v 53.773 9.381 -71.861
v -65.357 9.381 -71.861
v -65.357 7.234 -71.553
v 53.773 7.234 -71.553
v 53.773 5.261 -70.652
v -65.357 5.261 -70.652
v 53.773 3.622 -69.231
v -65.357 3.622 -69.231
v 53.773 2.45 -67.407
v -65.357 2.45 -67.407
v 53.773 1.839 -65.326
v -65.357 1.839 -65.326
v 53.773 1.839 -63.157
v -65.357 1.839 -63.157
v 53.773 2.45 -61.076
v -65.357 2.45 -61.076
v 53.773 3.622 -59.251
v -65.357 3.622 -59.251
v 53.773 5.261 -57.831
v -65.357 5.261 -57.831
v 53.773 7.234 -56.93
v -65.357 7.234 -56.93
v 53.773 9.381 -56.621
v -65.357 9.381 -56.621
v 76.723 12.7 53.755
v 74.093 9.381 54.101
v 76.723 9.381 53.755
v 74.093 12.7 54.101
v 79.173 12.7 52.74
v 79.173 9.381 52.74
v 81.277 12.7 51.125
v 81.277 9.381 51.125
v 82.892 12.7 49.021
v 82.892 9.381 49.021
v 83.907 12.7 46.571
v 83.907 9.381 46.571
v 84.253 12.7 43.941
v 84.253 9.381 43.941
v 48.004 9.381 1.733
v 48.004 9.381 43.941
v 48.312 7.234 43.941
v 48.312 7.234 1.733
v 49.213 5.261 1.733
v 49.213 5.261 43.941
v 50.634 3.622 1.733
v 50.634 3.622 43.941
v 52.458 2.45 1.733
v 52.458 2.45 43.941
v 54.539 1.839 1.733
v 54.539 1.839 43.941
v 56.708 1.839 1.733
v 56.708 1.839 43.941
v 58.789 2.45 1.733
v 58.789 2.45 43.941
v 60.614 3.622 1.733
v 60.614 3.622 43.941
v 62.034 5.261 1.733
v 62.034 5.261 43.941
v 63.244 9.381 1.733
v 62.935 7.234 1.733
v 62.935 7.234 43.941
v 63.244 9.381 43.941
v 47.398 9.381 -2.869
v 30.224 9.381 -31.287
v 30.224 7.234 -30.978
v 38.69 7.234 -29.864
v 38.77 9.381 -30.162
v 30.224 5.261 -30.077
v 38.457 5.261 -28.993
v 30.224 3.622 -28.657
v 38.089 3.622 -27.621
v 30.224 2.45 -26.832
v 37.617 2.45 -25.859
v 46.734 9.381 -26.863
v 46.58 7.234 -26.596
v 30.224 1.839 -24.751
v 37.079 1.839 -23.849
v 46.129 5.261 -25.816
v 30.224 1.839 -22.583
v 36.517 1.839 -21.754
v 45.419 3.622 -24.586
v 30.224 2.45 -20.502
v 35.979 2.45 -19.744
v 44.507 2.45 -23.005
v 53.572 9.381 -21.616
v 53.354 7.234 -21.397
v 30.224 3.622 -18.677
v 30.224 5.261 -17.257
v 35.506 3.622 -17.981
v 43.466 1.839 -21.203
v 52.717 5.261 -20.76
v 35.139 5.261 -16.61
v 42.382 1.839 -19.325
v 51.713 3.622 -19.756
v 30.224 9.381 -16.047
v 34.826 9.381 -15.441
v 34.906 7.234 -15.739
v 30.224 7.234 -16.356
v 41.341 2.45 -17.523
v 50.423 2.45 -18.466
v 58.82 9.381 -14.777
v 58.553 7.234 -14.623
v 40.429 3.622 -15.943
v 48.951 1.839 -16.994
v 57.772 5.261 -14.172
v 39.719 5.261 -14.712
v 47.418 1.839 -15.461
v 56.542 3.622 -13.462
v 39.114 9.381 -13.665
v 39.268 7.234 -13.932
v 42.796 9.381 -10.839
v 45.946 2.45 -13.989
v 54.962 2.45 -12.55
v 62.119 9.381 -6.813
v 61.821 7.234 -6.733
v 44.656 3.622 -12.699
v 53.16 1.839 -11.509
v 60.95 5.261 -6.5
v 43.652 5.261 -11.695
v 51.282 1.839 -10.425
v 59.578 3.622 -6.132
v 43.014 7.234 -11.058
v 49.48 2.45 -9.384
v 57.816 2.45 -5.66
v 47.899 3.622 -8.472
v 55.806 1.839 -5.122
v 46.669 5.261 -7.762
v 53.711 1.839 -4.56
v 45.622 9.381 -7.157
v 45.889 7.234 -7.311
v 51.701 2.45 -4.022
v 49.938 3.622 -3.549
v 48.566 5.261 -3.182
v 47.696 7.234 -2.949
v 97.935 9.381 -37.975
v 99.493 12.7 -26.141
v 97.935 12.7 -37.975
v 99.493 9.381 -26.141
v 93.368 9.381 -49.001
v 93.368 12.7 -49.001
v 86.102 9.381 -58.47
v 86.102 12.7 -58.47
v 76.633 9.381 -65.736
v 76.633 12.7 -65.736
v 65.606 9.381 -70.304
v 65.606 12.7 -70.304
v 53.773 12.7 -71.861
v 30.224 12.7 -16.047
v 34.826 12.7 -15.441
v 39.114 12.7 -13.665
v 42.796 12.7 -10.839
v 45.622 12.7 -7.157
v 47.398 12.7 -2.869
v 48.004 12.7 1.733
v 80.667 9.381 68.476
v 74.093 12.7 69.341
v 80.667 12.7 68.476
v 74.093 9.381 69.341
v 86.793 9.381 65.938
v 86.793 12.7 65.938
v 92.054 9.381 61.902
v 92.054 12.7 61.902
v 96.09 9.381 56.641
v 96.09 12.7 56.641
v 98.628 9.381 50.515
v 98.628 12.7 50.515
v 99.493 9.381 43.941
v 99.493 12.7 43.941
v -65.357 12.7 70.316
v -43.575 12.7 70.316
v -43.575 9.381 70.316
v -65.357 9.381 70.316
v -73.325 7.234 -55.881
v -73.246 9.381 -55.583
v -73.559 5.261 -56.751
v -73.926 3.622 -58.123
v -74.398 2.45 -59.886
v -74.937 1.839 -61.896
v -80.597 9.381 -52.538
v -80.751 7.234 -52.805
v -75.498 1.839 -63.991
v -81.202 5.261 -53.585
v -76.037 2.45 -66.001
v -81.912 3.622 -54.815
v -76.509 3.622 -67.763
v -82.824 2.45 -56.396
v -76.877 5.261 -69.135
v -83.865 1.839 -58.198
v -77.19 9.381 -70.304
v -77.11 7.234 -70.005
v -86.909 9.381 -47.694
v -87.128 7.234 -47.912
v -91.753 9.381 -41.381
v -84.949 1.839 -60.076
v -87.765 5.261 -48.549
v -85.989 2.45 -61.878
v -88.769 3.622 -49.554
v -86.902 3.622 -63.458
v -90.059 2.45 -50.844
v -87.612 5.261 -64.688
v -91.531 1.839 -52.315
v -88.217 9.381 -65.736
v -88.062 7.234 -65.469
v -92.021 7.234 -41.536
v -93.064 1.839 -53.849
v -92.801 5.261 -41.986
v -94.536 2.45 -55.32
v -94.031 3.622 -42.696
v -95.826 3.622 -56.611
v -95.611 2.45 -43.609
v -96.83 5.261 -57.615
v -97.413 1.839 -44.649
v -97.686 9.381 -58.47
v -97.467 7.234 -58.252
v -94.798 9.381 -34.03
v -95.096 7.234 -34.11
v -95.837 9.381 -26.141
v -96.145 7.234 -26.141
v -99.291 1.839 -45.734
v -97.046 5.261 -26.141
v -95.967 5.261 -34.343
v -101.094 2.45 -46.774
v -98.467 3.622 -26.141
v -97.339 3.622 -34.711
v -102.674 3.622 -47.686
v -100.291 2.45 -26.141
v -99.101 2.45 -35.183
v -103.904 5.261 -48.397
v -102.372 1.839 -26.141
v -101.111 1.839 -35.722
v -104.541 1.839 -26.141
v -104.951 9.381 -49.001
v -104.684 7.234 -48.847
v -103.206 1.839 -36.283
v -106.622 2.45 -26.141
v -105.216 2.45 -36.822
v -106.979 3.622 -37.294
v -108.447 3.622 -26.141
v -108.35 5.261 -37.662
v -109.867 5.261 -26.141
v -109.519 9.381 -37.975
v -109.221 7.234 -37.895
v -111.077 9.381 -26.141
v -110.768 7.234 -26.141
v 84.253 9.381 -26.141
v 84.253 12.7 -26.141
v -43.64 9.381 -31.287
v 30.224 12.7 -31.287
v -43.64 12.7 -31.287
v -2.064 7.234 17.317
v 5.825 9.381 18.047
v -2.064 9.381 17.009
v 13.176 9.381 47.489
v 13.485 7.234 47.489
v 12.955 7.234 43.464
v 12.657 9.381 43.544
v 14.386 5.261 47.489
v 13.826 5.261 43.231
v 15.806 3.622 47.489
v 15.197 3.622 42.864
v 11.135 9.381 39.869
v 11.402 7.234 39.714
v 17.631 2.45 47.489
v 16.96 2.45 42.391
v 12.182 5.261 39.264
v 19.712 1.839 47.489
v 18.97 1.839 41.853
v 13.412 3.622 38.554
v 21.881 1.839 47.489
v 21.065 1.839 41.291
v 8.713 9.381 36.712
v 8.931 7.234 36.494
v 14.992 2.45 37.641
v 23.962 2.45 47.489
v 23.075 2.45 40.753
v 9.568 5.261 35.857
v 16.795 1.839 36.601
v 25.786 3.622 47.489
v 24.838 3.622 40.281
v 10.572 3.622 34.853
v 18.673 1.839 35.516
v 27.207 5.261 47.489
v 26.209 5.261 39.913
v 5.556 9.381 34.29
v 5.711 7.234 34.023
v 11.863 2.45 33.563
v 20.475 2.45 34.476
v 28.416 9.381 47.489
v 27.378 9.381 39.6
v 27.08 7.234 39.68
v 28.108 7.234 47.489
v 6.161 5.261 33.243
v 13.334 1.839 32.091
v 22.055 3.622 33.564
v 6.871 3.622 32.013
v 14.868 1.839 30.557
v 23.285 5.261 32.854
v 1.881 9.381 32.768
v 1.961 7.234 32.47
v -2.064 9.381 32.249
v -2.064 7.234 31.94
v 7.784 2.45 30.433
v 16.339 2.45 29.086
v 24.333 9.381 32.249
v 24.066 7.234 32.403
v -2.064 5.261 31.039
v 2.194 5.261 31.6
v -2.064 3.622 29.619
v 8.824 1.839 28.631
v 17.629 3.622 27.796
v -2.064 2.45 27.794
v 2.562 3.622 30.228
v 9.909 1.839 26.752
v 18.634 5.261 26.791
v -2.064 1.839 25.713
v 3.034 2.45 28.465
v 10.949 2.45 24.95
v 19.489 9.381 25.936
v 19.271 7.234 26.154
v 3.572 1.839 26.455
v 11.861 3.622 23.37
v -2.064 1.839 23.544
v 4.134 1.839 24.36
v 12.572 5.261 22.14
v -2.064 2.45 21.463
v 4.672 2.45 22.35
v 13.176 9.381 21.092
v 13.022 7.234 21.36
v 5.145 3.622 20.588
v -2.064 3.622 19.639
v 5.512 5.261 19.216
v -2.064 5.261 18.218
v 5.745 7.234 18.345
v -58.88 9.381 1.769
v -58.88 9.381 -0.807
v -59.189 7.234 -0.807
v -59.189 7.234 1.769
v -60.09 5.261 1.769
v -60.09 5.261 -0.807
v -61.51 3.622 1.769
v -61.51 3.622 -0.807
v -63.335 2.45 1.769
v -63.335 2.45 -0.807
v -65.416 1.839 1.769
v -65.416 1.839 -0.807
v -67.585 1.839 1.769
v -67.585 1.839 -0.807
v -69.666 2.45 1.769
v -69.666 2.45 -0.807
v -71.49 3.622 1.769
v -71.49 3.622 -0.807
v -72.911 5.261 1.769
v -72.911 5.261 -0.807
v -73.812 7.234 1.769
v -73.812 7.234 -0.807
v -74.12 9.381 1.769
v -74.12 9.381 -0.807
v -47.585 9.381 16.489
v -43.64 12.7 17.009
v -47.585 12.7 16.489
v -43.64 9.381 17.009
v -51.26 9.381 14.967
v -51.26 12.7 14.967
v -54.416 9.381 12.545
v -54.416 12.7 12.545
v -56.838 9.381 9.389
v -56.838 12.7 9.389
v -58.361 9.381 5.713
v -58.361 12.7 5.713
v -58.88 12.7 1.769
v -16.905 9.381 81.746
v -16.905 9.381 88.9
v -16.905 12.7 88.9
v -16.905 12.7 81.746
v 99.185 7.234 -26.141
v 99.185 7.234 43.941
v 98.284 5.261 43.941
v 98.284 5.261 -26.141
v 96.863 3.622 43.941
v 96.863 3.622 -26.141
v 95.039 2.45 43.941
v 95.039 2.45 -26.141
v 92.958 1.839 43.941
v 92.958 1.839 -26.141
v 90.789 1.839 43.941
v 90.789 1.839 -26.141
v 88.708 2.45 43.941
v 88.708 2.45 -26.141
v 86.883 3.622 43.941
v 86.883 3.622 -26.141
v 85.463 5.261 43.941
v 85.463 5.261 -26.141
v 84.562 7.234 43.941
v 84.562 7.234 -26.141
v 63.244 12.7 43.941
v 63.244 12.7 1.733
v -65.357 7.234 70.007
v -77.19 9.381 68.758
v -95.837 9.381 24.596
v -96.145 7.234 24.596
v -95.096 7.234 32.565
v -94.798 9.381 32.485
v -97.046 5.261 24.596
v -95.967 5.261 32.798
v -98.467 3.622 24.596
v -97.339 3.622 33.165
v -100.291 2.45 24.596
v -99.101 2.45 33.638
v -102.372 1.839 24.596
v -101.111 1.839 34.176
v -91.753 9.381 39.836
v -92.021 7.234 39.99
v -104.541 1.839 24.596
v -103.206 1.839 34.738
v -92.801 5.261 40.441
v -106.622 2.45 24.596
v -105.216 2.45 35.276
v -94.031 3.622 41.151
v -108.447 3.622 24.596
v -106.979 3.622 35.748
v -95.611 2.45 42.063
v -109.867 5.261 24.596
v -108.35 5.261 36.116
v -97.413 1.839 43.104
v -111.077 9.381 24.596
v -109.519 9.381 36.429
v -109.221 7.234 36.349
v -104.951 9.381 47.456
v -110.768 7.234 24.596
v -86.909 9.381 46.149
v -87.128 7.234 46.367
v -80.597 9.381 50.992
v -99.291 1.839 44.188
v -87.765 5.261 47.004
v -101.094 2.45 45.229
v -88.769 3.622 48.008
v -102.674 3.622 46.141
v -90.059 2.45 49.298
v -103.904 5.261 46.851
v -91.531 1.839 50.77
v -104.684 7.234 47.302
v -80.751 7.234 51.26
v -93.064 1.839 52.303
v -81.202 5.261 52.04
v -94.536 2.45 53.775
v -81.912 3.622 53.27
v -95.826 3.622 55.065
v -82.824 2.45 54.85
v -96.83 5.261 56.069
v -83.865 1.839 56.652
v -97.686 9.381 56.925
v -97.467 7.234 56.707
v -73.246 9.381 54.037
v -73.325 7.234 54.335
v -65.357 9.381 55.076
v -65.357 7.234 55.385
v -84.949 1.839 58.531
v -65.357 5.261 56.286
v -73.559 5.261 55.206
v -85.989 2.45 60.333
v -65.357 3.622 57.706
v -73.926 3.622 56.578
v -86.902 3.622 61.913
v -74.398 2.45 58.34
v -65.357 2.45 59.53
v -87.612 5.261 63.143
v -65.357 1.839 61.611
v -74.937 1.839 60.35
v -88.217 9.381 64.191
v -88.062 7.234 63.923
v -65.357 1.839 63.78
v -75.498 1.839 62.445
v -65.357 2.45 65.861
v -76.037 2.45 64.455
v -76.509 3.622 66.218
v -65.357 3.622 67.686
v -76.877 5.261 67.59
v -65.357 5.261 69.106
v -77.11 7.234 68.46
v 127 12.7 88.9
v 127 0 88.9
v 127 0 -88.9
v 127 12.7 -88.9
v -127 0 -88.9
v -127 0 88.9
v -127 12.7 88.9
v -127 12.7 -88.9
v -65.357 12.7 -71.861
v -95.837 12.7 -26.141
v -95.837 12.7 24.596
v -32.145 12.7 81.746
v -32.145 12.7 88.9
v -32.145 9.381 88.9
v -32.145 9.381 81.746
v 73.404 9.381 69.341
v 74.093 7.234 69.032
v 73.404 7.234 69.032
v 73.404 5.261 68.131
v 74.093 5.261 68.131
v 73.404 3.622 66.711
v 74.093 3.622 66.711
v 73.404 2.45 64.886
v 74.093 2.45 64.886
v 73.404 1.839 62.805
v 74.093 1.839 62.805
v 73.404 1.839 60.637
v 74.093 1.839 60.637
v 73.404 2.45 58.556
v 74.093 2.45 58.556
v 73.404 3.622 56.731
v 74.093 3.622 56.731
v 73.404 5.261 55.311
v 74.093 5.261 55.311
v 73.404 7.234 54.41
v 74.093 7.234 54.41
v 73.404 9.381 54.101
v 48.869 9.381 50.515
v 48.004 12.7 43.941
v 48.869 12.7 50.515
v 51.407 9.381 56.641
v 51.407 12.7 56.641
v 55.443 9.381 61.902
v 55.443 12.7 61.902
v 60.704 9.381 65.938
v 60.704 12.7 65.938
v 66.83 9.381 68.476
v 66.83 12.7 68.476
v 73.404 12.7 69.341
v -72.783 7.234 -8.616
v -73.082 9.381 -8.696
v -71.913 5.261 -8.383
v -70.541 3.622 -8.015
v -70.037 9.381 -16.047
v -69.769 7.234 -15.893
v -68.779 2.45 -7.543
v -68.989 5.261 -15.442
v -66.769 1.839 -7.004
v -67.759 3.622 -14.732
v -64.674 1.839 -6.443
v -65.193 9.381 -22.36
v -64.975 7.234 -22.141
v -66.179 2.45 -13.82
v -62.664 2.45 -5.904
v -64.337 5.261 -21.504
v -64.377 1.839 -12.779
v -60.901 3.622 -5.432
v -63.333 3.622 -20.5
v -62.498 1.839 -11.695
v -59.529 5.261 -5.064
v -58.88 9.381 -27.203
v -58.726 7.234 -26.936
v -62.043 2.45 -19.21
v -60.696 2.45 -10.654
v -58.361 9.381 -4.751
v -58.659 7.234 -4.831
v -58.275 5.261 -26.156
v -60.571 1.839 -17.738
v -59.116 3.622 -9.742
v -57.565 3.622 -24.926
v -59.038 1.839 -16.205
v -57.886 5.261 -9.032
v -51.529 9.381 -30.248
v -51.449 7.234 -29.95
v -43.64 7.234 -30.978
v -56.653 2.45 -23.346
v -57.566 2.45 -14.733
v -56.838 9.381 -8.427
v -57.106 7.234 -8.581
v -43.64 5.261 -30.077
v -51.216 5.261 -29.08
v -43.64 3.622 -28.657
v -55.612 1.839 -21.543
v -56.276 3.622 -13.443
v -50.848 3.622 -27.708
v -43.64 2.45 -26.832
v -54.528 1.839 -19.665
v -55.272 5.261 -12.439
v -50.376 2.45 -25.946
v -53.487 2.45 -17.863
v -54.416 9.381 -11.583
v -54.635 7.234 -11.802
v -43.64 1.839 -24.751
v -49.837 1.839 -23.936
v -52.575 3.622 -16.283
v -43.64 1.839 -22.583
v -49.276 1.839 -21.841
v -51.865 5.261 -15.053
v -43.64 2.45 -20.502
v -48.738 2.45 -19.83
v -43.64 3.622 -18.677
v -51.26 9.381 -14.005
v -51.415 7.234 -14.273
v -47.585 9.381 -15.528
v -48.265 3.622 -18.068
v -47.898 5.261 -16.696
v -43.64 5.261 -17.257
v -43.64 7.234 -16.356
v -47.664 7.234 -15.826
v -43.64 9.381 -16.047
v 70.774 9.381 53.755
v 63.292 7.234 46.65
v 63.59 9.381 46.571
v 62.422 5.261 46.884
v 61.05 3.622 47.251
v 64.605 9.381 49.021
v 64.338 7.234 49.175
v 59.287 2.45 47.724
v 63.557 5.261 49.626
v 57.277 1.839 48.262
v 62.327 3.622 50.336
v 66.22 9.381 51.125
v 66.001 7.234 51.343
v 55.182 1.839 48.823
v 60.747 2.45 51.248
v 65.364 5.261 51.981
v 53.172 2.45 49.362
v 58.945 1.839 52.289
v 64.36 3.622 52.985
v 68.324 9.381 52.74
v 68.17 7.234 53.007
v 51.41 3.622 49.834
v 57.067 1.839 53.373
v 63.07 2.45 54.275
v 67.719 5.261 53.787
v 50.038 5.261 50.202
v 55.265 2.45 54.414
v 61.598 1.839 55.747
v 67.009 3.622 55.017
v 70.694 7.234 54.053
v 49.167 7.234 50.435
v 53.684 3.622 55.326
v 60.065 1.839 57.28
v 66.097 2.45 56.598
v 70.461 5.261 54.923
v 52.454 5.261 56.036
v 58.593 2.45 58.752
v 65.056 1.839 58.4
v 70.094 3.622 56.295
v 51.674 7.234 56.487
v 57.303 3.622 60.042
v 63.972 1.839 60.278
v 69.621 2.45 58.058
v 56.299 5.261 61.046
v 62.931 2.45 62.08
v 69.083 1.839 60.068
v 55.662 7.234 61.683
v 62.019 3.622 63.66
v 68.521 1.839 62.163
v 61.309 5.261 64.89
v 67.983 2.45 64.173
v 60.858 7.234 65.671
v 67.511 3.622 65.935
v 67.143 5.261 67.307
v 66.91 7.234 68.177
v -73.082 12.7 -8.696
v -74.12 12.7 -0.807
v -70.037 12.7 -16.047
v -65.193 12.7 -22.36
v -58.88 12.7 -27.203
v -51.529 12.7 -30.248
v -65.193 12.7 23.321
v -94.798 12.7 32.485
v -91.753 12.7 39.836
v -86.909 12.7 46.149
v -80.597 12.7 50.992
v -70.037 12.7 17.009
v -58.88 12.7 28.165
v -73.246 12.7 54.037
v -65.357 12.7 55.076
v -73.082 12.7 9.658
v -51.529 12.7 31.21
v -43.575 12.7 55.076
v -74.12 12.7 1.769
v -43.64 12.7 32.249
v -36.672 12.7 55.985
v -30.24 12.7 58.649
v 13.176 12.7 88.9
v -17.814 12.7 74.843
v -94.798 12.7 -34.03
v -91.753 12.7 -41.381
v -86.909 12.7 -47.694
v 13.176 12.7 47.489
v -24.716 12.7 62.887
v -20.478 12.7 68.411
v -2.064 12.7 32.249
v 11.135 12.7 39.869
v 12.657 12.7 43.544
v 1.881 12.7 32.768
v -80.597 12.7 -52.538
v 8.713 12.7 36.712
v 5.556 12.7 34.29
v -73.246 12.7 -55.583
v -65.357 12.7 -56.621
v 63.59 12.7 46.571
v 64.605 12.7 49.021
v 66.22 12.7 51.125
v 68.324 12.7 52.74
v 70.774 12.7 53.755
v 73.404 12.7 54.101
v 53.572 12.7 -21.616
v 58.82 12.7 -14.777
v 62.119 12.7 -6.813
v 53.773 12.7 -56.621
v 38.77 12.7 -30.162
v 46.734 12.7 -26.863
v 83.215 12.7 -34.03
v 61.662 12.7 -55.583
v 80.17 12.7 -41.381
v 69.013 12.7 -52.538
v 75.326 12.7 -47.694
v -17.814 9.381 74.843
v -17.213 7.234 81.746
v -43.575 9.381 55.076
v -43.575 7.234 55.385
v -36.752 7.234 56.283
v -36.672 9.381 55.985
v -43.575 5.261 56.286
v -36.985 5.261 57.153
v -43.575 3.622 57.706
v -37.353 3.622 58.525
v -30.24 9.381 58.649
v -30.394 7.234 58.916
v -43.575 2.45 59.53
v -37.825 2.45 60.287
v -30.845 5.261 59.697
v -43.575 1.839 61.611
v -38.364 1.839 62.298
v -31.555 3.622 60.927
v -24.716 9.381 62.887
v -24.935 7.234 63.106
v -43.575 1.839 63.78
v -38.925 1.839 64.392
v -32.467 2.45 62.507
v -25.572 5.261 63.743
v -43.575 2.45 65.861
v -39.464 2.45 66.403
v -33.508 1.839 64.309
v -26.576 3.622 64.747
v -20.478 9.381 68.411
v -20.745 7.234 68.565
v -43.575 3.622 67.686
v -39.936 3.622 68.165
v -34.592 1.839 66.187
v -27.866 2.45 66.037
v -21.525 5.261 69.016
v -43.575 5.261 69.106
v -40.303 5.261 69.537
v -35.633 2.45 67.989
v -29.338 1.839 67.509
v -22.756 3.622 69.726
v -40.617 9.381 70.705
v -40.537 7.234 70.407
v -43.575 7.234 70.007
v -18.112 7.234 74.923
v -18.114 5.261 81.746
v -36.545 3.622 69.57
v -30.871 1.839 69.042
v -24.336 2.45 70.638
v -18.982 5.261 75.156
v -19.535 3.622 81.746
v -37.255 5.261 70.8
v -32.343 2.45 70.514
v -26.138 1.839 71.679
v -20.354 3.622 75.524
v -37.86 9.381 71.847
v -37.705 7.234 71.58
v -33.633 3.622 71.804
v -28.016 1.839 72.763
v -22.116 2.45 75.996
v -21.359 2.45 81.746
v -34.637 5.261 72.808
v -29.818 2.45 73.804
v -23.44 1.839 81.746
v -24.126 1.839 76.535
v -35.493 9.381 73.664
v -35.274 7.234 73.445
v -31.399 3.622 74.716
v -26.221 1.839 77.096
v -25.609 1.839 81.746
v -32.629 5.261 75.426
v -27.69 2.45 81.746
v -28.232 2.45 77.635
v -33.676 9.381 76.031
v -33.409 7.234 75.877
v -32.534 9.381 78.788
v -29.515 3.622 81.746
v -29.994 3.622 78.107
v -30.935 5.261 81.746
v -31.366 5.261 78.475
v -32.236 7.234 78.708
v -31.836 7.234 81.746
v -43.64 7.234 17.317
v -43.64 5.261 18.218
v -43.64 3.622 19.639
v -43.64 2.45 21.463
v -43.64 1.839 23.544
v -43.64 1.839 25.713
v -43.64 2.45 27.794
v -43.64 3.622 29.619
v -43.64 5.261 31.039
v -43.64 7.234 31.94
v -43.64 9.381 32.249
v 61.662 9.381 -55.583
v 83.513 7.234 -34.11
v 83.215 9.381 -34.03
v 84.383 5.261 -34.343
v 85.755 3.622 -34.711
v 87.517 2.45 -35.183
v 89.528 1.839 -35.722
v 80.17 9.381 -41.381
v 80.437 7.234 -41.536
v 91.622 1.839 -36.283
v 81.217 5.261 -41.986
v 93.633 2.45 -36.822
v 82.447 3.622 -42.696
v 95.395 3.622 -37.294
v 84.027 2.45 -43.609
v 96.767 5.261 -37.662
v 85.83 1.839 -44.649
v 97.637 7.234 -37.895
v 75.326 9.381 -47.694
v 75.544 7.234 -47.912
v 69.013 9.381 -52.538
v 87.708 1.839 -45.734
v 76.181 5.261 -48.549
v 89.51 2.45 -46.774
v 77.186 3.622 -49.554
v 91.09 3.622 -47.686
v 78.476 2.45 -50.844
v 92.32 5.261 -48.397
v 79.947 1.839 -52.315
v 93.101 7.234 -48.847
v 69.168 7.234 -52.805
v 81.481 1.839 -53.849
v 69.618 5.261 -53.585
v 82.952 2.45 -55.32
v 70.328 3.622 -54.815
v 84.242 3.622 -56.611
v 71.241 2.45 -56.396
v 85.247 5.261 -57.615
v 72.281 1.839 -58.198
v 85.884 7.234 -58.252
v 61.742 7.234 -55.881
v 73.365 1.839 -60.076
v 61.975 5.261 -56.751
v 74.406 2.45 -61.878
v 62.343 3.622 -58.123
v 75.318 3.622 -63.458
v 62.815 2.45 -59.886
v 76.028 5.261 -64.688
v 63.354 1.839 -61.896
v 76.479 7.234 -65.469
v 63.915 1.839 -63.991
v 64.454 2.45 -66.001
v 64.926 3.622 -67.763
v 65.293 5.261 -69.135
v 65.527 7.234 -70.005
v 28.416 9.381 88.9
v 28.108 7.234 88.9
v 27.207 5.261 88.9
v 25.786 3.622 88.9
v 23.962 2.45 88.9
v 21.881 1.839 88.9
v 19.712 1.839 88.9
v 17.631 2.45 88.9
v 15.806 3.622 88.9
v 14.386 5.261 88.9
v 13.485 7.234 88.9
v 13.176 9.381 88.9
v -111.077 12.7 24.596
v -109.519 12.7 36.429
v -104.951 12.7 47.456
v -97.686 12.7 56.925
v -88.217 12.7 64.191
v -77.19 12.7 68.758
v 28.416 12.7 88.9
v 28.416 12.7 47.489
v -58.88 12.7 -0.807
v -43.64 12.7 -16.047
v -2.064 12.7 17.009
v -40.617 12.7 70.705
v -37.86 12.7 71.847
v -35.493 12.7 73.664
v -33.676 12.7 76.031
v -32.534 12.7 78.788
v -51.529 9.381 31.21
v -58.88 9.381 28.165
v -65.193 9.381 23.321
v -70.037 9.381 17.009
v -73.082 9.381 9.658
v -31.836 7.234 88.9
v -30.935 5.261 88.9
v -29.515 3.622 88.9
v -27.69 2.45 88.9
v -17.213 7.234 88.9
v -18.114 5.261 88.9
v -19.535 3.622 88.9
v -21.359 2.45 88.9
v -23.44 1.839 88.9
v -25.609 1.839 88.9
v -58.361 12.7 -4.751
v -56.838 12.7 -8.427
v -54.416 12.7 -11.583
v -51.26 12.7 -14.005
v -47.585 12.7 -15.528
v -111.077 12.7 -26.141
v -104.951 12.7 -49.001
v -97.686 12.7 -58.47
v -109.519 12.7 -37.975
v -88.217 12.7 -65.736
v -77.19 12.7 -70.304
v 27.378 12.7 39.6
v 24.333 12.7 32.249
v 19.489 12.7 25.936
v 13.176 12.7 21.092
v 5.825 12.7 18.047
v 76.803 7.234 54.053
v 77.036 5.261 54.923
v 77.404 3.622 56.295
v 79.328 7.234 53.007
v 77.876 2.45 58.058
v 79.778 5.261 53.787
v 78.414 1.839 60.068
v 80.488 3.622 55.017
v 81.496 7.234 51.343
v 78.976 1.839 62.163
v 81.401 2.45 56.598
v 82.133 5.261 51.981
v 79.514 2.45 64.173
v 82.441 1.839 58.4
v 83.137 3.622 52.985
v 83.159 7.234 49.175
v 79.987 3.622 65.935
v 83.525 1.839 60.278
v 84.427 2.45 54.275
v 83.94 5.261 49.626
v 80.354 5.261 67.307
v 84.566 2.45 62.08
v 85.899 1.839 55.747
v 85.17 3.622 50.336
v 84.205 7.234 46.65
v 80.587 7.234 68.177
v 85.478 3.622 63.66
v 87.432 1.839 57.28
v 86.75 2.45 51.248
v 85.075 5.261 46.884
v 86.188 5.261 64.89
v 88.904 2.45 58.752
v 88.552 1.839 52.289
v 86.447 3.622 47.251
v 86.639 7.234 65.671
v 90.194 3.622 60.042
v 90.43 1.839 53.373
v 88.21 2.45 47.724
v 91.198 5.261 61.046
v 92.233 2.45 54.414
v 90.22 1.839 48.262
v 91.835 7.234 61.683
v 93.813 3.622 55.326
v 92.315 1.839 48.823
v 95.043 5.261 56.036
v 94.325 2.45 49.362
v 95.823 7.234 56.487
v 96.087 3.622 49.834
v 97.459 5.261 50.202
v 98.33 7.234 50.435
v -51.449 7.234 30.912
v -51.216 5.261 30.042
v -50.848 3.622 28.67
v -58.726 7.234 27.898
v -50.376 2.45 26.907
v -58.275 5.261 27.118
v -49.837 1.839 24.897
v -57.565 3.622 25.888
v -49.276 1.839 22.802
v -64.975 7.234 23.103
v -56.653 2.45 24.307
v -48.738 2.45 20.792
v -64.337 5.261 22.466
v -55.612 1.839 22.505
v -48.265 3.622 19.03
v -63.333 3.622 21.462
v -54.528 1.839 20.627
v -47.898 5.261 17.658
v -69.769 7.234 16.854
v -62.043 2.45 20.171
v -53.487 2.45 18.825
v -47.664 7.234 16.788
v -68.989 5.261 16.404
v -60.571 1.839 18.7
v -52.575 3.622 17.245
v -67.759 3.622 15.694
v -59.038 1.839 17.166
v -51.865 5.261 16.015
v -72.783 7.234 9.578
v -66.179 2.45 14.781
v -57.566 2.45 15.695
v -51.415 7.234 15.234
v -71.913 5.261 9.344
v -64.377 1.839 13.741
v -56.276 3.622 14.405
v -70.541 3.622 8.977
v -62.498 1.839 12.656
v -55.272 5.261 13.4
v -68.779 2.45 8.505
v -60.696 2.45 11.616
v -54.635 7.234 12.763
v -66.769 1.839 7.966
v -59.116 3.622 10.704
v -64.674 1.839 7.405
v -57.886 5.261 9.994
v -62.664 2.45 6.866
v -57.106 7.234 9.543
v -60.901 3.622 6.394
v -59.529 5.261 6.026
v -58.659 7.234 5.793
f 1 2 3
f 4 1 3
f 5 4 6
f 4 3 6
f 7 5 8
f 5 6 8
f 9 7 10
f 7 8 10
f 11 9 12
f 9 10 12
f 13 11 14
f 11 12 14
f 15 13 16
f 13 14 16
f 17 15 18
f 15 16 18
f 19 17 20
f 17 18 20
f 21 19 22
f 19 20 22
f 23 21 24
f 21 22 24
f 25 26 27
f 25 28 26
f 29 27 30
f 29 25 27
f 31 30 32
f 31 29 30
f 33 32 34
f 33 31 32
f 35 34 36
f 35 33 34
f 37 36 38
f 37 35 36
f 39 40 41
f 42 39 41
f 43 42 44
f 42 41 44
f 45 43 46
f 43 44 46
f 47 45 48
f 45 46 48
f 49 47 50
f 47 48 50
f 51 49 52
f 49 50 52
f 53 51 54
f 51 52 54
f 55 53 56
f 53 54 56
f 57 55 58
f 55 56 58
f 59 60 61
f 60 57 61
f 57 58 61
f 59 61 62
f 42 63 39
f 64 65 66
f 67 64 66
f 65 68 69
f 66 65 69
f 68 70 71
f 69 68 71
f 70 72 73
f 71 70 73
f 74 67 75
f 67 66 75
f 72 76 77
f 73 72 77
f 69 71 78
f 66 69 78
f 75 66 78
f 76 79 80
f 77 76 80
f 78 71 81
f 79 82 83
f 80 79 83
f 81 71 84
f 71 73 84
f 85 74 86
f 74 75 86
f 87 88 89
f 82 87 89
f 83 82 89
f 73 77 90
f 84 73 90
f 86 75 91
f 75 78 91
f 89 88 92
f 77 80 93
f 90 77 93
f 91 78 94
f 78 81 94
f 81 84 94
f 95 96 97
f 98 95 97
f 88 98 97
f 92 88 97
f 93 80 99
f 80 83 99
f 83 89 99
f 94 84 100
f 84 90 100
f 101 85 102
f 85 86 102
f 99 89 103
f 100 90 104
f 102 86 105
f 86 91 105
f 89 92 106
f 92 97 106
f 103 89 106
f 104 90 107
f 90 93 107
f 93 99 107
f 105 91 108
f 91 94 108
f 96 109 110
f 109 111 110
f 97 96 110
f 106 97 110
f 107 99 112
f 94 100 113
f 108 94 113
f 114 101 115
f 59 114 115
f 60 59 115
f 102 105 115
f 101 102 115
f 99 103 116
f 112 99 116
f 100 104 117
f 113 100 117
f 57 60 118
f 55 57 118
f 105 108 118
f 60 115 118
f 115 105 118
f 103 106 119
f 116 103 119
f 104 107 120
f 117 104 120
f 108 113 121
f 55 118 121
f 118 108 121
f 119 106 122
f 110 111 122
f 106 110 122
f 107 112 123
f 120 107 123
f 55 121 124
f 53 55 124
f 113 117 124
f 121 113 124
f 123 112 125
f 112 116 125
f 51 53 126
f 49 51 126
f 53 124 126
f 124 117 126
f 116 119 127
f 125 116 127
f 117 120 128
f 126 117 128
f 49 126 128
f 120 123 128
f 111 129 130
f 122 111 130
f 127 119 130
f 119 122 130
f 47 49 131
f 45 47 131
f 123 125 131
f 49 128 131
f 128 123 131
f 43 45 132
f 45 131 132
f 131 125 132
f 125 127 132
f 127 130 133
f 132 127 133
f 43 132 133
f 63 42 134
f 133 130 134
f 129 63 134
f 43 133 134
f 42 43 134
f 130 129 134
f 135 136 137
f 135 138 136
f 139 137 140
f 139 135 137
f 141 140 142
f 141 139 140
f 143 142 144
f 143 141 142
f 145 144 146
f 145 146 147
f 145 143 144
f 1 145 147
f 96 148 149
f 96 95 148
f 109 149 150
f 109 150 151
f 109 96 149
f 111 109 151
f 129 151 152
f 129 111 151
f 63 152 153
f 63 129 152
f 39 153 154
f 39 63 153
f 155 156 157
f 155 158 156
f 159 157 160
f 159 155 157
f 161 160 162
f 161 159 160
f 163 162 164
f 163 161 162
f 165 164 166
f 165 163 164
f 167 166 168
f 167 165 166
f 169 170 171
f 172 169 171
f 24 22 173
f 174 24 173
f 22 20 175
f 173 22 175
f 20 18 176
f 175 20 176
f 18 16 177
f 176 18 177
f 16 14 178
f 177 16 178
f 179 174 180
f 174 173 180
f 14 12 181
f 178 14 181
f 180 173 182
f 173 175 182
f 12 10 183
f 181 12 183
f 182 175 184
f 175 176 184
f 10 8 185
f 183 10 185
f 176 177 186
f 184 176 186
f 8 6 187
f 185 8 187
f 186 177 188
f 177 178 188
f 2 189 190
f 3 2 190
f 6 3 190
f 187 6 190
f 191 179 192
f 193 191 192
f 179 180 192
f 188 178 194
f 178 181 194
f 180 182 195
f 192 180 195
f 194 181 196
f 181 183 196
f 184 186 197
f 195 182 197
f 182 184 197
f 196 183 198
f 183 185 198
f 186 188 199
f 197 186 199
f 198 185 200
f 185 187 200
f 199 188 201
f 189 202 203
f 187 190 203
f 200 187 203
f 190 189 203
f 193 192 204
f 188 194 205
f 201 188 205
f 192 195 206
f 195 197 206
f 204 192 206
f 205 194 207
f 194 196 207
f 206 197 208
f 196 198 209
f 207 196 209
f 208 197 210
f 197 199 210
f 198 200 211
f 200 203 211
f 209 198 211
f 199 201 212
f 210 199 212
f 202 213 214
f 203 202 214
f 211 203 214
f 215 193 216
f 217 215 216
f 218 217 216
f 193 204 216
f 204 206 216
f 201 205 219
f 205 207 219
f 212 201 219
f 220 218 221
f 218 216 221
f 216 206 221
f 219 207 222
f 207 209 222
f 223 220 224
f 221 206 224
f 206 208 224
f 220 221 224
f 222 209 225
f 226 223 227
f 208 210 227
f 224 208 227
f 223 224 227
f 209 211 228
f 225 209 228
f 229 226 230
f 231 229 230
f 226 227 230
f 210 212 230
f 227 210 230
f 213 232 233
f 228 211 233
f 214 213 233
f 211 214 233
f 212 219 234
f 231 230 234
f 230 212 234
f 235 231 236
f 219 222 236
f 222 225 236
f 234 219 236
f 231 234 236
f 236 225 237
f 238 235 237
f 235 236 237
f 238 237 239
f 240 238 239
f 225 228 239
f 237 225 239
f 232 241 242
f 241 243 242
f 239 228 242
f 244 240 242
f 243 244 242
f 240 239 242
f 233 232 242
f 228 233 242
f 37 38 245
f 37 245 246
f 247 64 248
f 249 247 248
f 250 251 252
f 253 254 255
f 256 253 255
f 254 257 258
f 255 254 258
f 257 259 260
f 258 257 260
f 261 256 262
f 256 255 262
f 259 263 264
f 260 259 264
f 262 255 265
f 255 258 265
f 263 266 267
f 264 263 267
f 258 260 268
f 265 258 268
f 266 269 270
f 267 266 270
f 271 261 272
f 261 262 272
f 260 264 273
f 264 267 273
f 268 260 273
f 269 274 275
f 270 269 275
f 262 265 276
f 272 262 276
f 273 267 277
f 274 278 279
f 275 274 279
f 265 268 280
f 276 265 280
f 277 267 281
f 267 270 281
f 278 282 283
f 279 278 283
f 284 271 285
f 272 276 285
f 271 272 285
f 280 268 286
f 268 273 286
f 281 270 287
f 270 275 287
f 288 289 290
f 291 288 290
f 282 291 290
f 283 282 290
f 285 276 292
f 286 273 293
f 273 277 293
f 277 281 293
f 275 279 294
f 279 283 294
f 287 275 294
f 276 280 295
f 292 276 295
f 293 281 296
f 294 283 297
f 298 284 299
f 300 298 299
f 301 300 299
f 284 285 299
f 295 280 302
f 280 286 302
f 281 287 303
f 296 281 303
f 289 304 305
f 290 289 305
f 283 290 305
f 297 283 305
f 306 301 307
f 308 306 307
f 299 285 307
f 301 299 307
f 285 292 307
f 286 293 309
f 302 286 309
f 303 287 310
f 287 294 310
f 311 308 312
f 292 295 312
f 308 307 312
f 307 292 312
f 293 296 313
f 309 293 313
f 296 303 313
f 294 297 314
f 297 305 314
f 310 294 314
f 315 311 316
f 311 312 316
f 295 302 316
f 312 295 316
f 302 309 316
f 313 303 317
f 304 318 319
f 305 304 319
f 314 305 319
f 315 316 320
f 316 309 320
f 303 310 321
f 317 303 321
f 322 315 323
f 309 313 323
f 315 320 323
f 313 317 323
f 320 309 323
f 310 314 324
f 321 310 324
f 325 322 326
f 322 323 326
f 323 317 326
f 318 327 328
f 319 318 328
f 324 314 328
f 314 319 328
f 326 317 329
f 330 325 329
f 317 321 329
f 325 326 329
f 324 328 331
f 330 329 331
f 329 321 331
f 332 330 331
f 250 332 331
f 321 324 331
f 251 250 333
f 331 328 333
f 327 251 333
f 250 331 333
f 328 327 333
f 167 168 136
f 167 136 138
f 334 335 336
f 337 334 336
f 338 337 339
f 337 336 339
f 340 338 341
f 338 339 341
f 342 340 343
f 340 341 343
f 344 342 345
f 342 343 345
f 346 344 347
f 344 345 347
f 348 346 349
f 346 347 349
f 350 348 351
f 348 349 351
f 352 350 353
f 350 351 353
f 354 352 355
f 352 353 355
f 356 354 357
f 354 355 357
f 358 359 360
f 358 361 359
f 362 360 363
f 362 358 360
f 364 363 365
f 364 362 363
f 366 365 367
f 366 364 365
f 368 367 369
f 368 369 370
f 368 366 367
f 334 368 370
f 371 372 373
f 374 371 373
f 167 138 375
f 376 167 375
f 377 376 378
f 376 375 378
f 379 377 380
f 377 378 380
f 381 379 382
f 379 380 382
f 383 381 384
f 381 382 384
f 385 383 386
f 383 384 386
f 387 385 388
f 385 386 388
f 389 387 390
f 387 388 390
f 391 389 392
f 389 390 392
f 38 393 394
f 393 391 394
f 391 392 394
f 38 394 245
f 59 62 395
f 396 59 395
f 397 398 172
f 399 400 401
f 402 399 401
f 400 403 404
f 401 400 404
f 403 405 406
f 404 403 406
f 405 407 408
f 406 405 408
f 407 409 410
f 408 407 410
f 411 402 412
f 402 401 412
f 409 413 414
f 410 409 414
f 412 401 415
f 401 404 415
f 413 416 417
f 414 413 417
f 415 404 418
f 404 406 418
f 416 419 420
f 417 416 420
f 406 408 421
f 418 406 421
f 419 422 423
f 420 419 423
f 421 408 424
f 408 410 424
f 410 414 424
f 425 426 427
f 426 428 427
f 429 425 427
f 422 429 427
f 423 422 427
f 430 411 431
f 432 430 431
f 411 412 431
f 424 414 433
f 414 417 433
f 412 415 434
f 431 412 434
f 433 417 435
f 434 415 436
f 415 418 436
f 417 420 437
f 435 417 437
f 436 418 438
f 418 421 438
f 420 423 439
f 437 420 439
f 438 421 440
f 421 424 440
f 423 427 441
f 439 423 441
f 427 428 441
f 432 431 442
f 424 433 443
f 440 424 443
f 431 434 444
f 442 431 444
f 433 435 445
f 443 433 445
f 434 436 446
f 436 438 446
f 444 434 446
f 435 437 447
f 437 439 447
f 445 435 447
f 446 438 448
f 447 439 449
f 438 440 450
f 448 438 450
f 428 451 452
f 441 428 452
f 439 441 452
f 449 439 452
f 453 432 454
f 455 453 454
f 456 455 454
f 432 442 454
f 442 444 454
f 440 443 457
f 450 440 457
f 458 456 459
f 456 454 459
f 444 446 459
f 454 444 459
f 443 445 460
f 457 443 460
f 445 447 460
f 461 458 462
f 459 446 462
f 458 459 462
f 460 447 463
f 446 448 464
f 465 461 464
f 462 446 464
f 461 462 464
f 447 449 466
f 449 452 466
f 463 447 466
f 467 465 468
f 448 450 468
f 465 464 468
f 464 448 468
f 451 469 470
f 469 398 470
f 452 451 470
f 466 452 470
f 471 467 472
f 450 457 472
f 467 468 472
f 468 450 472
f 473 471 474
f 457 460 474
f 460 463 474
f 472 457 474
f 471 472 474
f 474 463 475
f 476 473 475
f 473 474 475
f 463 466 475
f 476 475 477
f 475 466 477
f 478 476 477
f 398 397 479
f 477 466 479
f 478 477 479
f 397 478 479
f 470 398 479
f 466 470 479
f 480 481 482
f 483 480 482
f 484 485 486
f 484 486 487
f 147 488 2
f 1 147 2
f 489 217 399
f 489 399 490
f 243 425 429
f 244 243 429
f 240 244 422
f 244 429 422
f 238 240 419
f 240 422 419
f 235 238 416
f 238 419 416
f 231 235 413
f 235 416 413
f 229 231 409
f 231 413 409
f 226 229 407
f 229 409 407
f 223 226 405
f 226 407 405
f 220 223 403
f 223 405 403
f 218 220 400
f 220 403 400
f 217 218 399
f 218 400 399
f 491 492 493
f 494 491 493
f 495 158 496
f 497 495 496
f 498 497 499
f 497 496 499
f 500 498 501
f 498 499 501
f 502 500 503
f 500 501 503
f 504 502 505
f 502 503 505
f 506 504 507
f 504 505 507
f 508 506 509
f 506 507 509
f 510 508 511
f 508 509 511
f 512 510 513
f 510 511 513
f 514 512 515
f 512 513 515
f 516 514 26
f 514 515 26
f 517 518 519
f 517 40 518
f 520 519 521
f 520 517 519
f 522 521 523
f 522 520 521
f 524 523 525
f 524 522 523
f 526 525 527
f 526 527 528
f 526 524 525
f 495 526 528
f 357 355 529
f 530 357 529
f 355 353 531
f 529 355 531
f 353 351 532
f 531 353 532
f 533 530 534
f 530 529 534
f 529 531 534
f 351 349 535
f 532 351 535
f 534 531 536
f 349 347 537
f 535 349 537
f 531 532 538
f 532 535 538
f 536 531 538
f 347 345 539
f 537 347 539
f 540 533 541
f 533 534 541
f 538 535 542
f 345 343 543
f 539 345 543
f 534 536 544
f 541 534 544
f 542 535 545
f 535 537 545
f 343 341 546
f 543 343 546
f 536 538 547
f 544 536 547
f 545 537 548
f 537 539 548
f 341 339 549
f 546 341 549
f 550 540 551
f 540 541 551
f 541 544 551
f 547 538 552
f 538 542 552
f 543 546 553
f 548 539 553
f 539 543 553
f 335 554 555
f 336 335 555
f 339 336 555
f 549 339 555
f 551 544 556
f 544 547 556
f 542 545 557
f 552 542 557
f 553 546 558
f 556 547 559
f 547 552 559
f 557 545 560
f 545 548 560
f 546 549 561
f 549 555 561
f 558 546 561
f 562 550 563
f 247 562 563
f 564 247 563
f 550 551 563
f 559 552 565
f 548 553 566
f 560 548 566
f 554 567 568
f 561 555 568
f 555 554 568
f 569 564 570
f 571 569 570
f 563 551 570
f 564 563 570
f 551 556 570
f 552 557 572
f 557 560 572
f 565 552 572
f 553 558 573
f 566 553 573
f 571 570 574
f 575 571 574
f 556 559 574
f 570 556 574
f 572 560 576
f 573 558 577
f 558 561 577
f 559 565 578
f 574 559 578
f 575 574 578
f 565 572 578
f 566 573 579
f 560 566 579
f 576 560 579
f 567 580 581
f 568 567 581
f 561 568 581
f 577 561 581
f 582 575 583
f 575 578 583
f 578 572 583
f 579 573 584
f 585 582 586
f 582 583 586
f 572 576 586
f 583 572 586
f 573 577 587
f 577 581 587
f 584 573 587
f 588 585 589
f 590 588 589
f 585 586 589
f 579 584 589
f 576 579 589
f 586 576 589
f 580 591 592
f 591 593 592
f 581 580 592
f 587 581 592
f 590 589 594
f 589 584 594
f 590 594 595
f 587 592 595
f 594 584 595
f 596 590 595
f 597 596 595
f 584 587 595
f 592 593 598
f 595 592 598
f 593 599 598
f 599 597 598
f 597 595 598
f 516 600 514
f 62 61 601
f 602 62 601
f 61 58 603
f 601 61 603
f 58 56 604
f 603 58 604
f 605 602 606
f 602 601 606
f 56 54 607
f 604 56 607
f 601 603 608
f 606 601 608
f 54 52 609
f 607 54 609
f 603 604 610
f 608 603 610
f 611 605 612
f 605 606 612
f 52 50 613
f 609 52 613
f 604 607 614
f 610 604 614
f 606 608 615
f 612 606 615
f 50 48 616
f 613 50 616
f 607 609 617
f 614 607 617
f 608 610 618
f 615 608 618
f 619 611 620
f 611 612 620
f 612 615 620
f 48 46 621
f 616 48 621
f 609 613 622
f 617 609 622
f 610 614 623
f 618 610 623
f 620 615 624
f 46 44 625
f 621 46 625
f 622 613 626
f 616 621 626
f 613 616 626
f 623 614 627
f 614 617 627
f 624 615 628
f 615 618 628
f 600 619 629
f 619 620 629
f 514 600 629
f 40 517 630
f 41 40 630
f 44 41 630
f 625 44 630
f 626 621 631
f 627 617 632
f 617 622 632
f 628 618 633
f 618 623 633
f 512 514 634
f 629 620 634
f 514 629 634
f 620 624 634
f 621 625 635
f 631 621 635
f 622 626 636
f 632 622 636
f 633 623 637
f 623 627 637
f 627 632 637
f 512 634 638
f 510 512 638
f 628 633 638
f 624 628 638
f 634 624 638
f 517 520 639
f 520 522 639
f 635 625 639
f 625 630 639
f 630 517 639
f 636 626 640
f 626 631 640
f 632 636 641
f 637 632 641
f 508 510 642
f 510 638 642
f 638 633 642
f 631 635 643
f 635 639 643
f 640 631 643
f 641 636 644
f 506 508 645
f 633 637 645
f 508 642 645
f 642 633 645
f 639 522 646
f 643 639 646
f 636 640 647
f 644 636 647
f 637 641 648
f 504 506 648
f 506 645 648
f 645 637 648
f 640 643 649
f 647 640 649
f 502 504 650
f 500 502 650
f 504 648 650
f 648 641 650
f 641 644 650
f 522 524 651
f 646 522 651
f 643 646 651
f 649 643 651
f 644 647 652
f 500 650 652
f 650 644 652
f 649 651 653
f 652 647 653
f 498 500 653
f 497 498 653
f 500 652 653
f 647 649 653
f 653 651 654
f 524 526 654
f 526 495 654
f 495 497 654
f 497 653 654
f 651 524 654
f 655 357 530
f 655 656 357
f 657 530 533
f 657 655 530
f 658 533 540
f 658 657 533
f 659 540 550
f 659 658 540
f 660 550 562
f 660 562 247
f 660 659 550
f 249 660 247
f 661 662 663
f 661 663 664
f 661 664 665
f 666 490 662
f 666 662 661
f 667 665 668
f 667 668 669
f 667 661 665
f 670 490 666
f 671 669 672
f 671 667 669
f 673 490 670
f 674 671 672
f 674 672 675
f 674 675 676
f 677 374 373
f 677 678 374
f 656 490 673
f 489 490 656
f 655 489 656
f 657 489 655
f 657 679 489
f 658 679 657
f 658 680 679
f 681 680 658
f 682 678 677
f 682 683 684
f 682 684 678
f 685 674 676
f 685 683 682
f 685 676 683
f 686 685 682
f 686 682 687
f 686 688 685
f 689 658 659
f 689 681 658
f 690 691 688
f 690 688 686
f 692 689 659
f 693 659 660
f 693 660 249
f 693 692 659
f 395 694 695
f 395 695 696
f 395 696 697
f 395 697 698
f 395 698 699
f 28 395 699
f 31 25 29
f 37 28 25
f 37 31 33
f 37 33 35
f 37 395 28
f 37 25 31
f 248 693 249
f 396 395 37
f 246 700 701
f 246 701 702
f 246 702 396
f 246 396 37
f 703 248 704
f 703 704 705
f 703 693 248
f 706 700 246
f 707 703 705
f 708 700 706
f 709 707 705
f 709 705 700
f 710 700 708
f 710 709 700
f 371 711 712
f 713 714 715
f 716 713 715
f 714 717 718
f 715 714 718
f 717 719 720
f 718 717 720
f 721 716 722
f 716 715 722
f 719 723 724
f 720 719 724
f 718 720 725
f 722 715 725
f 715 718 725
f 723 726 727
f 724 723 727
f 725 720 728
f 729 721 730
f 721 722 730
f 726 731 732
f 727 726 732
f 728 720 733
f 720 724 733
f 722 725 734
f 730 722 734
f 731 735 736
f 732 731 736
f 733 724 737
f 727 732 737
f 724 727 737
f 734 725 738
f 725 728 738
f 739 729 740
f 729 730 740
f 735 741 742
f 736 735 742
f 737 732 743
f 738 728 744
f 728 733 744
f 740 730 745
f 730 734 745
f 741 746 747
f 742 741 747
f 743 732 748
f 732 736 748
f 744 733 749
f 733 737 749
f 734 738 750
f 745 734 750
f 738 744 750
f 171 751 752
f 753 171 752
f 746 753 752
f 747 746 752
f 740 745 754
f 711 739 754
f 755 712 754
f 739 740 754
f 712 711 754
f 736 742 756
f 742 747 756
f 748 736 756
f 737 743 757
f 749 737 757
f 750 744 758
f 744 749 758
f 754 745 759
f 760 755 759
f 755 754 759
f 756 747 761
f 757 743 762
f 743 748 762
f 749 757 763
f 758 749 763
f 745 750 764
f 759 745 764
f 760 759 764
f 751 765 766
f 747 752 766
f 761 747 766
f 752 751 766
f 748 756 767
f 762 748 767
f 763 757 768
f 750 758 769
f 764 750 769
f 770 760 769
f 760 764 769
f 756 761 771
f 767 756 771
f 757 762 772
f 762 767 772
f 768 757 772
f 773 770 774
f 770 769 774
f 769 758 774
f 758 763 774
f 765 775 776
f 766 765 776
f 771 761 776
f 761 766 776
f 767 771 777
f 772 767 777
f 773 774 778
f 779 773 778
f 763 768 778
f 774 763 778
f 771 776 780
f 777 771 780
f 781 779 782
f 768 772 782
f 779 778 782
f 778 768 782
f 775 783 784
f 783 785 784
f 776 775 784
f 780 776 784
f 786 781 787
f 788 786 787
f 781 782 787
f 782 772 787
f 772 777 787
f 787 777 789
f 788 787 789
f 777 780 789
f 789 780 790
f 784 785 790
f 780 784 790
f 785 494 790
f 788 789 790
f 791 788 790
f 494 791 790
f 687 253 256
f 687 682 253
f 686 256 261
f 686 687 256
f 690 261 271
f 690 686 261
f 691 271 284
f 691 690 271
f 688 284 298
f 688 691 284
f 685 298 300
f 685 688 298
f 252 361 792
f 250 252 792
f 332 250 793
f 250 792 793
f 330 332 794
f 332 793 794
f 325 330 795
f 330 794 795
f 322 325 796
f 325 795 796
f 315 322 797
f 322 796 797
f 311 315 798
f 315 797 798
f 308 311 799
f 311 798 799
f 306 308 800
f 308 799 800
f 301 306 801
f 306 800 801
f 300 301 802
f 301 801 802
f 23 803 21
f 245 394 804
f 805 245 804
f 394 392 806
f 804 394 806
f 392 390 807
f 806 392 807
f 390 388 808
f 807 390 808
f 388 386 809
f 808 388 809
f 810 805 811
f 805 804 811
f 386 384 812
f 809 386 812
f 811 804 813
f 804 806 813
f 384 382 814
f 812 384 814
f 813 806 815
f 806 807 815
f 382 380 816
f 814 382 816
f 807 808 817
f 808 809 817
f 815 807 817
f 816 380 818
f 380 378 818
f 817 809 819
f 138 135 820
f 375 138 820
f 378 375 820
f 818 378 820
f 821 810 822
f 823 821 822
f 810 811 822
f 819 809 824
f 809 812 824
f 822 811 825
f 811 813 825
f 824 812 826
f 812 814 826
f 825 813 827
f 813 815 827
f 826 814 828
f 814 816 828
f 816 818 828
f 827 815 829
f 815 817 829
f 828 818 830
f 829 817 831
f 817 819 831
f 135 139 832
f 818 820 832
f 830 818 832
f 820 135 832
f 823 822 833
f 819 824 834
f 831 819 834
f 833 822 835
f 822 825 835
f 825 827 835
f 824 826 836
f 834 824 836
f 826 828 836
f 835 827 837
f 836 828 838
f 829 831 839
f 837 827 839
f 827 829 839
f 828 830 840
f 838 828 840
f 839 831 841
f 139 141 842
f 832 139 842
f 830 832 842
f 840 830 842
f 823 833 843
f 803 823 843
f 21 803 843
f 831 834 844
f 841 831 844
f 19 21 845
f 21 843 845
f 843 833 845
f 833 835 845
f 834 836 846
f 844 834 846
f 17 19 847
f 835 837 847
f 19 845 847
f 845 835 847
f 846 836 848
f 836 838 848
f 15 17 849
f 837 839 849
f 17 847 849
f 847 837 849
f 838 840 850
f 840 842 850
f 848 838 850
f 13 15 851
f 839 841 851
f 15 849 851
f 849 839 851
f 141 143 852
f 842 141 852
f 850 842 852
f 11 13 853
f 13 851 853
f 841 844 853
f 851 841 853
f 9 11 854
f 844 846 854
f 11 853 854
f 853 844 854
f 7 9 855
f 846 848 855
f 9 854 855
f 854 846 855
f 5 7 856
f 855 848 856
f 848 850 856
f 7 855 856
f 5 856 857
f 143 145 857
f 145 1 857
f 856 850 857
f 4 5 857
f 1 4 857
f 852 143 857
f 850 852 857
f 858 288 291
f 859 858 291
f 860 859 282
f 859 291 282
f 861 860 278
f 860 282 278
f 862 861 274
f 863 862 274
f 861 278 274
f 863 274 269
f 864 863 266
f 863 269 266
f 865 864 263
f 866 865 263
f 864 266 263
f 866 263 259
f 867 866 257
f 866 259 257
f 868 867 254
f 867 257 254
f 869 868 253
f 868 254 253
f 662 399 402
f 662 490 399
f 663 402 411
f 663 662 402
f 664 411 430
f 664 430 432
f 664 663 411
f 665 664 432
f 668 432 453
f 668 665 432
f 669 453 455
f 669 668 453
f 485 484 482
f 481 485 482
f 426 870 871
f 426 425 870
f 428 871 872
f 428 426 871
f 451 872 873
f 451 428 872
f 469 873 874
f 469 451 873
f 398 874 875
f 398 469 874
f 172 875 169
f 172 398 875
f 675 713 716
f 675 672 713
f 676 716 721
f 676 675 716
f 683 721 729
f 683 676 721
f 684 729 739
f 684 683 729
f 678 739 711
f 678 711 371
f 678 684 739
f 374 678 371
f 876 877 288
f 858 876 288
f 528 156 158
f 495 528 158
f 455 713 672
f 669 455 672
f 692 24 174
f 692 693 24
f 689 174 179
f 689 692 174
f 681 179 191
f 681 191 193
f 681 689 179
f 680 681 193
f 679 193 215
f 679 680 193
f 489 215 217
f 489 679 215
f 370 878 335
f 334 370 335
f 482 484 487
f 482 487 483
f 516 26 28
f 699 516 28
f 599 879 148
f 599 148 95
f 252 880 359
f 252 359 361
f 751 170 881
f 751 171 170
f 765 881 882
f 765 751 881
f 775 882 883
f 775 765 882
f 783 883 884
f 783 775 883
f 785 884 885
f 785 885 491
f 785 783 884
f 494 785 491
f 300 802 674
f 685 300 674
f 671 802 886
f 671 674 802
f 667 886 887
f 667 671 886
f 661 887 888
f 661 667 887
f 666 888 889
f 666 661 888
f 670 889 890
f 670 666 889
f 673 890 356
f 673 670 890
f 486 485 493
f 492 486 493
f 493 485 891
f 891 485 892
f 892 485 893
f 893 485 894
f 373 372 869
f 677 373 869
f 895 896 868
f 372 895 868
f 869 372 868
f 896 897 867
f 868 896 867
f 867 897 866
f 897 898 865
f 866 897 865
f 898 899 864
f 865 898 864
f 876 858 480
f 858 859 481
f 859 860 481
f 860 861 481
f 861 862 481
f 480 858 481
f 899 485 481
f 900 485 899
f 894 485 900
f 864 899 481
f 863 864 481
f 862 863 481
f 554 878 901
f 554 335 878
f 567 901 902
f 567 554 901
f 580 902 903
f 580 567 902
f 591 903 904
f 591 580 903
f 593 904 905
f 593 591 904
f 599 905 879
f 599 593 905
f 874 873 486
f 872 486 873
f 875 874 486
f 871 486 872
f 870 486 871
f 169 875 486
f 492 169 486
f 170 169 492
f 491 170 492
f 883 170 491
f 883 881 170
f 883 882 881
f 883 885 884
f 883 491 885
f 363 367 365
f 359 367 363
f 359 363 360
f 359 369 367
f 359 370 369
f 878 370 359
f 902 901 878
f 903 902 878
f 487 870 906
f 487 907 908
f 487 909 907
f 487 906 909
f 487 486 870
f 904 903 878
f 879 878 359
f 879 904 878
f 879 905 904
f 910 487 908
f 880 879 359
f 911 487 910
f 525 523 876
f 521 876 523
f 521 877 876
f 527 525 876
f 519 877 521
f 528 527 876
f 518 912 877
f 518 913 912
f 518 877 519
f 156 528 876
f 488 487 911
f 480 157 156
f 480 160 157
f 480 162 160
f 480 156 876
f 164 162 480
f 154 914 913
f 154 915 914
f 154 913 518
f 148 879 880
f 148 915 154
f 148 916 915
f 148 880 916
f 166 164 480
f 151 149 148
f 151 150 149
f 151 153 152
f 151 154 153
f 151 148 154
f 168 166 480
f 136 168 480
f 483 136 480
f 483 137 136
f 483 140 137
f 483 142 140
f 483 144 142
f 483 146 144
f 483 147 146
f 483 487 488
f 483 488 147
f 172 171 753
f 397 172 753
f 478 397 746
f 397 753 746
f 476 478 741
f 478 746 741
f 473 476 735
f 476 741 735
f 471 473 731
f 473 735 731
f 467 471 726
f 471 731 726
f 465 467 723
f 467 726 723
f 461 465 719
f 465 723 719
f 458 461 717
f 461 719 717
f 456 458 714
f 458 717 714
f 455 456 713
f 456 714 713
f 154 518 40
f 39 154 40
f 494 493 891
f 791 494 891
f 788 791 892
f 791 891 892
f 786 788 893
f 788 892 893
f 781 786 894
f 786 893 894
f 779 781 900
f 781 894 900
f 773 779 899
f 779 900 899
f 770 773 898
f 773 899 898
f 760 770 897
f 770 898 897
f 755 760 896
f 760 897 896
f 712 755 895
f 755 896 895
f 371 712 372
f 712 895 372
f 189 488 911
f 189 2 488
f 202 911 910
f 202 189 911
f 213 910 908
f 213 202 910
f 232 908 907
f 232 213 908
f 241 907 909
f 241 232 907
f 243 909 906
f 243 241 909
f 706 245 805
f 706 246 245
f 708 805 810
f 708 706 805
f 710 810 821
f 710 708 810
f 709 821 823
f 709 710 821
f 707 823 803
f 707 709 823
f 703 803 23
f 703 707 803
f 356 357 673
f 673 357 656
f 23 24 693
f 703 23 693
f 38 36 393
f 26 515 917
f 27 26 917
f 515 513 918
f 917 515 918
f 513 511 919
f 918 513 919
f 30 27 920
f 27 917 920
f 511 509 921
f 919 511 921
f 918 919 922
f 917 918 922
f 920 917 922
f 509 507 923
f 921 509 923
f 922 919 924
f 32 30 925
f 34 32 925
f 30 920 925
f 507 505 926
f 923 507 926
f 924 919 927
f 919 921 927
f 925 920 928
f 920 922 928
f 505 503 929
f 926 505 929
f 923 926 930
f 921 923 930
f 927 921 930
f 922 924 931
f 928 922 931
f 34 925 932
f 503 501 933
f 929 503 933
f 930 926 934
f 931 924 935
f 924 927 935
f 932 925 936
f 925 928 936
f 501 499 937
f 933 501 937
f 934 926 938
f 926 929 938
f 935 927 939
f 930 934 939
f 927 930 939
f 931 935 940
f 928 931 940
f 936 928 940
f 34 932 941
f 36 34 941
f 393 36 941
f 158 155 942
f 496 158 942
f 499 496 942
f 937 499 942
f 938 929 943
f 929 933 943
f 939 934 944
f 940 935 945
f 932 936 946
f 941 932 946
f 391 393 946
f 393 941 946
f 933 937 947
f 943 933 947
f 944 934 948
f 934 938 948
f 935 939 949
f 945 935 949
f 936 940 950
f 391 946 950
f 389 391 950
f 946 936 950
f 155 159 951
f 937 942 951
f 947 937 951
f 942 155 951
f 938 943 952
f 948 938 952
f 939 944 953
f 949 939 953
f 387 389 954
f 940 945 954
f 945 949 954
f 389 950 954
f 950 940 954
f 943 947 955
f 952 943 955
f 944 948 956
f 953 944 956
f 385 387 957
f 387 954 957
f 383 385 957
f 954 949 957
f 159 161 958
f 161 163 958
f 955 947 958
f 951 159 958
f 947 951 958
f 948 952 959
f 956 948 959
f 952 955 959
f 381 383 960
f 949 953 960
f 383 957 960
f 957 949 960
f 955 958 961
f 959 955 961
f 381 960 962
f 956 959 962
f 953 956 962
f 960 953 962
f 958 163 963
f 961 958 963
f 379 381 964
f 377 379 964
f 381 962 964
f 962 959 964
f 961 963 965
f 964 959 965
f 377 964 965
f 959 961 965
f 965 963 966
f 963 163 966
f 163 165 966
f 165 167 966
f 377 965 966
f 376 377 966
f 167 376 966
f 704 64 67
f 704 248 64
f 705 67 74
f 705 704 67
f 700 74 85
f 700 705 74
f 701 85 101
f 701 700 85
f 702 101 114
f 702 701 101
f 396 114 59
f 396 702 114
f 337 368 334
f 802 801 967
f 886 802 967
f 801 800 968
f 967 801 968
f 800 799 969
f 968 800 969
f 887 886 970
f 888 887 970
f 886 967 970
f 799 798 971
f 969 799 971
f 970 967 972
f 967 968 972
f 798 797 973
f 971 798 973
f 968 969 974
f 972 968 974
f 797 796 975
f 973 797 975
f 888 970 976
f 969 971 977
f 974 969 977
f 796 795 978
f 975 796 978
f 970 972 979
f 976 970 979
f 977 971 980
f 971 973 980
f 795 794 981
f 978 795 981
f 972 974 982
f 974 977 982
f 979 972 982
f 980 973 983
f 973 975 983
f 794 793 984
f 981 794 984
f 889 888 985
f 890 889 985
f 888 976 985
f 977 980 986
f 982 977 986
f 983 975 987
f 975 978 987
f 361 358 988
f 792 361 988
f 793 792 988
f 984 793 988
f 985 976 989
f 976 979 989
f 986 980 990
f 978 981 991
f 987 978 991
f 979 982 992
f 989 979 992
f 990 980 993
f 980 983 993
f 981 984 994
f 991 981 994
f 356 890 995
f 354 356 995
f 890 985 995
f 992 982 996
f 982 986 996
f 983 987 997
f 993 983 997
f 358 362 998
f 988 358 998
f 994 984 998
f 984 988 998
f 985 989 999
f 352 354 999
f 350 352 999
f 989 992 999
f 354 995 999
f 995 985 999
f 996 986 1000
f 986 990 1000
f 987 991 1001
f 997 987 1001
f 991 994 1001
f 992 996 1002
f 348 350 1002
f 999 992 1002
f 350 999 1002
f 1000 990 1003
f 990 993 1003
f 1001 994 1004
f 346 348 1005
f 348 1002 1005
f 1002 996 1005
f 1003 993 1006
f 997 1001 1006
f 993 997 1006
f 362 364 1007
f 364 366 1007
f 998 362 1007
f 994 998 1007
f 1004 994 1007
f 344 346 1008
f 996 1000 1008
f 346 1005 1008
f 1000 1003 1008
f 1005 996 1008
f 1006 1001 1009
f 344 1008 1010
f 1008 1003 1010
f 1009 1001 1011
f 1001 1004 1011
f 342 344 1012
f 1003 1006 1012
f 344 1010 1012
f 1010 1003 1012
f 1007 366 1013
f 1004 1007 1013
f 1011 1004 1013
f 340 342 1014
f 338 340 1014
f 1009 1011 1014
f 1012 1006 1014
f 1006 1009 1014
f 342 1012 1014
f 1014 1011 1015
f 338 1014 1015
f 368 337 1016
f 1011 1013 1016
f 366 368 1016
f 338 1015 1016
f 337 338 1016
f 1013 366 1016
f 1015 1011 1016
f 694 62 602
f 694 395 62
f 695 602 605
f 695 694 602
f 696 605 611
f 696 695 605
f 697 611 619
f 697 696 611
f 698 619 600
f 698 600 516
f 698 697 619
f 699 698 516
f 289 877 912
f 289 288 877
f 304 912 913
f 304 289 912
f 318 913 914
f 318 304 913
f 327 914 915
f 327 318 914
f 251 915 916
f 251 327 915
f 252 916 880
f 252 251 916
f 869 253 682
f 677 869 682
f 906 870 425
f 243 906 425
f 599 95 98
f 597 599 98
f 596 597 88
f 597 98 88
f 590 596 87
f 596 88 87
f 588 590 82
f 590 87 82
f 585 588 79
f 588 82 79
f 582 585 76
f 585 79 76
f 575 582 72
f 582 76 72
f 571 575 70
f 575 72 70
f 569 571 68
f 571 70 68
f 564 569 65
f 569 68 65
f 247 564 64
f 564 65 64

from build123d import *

# Parameters (mm, degrees)
SKETCH1_W           = 254
SKETCH1_H           = 177.8
BOSS_EXTRUDE1_DEPTH = 12.7


with BuildPart() as part:
    # Sketch1 → Boss-Extrude1 (new body)
    with BuildSketch(Plane(origin=(0, 0, 0), x_dir=(1, 0, 0), z_dir=(0, 1, 0))):
        Rectangle(SKETCH1_W, SKETCH1_H)
    extrude(amount=BOSS_EXTRUDE1_DEPTH)

    # Cut-Sweep2: sweep along a path in Sketch2
    with BuildLine(Plane(origin=(0, 12.7, 0), x_dir=(1, 0, 0), z_dir=(0, 1, 0))) as cut_sweep2_path:
        Line((20.796437491, -88.9), (20.796437491, -47.488713932))
        ThreePointArc((20.796437491, -47.488713932), (14.100898509, -31.324252914), (-2.063562509, -24.628713932))
        Line((-2.063562509, -24.628713932), (-27.110242968, -24.628713932))
        Line((-27.110242968, -24.628713932), (-43.640180234, -24.628713932))
        ThreePointArc((-43.640180234, -24.628713932), (-59.804641252, -17.93317495), (-66.500180234, -1.768713932))
        Line((-66.500180234, -1.768713932), (-66.500180234, 0.806968371))
        ThreePointArc((-66.500180234, 0.806968371), (-59.804641252, 16.971429389), (-43.640180234, 23.666968371))
        Line((-43.640180234, 23.666968371), (30.223833761, 23.666968371))
        ThreePointArc((30.223833761, 23.666968371), (48.184346003, 16.227480613), (55.623833761, -1.733031629))
        Line((55.623833761, -1.733031629), (55.623833761, -43.941009117))
        ThreePointArc((55.623833761, -43.941009117), (60.831475192, -56.513367686), (73.403833761, -61.721009117))
        Line((73.403833761, -61.721009117), (74.093236775, -61.721009117))
        ThreePointArc((74.093236775, -61.721009117), (86.665595344, -56.513367686), (91.873236775, -43.941009117))
        Line((91.873236775, -43.941009117), (91.873236775, 26.14139739))
        ThreePointArc((91.873236775, 26.14139739), (80.714005138, 53.082165753), (53.773236775, 64.24139739))
        Line((53.773236775, 64.24139739), (-65.356762302, 64.24139739))
        ThreePointArc((-65.356762302, 64.24139739), (-92.297530666, 53.082165753), (-103.456762302, 26.14139739))
        Line((-103.456762302, 26.14139739), (-103.456762302, -24.595886827))
        ThreePointArc((-103.456762302, -24.595886827), (-92.297530666, -51.53665519), (-65.356762302, -62.695886827))
        Line((-65.356762302, -62.695886827), (-43.57480307, -62.695886827))
        ThreePointArc((-43.57480307, -62.695886827), (-30.104418888, -68.275502645), (-24.52480307, -81.745886827))
        Line((-24.52480307, -81.745886827), (-24.52480307, -88.9))
    # Sketch3 → Cut-Sweep2 (sweep, cut)
    with BuildSketch(Plane.XY.offset(88.9)):
        with BuildLine():
            Line((-16.90480307, 12.7), (-16.90480307, 9.380942321))
            ThreePointArc((-16.90480307, 9.380942321), (-24.52480307, 1.760942321), (-32.14480307, 9.380942321))
            Line((-32.14480307, 9.380942321), (-32.14480307, 12.7))
            ThreePointArc((-32.14480307, 12.7), (-24.52480307, 20.32), (-16.90480307, 12.7))
        make_face()
    sweep(path=cut_sweep2_path.line, mode=Mode.SUBTRACT)


solid = part.part
